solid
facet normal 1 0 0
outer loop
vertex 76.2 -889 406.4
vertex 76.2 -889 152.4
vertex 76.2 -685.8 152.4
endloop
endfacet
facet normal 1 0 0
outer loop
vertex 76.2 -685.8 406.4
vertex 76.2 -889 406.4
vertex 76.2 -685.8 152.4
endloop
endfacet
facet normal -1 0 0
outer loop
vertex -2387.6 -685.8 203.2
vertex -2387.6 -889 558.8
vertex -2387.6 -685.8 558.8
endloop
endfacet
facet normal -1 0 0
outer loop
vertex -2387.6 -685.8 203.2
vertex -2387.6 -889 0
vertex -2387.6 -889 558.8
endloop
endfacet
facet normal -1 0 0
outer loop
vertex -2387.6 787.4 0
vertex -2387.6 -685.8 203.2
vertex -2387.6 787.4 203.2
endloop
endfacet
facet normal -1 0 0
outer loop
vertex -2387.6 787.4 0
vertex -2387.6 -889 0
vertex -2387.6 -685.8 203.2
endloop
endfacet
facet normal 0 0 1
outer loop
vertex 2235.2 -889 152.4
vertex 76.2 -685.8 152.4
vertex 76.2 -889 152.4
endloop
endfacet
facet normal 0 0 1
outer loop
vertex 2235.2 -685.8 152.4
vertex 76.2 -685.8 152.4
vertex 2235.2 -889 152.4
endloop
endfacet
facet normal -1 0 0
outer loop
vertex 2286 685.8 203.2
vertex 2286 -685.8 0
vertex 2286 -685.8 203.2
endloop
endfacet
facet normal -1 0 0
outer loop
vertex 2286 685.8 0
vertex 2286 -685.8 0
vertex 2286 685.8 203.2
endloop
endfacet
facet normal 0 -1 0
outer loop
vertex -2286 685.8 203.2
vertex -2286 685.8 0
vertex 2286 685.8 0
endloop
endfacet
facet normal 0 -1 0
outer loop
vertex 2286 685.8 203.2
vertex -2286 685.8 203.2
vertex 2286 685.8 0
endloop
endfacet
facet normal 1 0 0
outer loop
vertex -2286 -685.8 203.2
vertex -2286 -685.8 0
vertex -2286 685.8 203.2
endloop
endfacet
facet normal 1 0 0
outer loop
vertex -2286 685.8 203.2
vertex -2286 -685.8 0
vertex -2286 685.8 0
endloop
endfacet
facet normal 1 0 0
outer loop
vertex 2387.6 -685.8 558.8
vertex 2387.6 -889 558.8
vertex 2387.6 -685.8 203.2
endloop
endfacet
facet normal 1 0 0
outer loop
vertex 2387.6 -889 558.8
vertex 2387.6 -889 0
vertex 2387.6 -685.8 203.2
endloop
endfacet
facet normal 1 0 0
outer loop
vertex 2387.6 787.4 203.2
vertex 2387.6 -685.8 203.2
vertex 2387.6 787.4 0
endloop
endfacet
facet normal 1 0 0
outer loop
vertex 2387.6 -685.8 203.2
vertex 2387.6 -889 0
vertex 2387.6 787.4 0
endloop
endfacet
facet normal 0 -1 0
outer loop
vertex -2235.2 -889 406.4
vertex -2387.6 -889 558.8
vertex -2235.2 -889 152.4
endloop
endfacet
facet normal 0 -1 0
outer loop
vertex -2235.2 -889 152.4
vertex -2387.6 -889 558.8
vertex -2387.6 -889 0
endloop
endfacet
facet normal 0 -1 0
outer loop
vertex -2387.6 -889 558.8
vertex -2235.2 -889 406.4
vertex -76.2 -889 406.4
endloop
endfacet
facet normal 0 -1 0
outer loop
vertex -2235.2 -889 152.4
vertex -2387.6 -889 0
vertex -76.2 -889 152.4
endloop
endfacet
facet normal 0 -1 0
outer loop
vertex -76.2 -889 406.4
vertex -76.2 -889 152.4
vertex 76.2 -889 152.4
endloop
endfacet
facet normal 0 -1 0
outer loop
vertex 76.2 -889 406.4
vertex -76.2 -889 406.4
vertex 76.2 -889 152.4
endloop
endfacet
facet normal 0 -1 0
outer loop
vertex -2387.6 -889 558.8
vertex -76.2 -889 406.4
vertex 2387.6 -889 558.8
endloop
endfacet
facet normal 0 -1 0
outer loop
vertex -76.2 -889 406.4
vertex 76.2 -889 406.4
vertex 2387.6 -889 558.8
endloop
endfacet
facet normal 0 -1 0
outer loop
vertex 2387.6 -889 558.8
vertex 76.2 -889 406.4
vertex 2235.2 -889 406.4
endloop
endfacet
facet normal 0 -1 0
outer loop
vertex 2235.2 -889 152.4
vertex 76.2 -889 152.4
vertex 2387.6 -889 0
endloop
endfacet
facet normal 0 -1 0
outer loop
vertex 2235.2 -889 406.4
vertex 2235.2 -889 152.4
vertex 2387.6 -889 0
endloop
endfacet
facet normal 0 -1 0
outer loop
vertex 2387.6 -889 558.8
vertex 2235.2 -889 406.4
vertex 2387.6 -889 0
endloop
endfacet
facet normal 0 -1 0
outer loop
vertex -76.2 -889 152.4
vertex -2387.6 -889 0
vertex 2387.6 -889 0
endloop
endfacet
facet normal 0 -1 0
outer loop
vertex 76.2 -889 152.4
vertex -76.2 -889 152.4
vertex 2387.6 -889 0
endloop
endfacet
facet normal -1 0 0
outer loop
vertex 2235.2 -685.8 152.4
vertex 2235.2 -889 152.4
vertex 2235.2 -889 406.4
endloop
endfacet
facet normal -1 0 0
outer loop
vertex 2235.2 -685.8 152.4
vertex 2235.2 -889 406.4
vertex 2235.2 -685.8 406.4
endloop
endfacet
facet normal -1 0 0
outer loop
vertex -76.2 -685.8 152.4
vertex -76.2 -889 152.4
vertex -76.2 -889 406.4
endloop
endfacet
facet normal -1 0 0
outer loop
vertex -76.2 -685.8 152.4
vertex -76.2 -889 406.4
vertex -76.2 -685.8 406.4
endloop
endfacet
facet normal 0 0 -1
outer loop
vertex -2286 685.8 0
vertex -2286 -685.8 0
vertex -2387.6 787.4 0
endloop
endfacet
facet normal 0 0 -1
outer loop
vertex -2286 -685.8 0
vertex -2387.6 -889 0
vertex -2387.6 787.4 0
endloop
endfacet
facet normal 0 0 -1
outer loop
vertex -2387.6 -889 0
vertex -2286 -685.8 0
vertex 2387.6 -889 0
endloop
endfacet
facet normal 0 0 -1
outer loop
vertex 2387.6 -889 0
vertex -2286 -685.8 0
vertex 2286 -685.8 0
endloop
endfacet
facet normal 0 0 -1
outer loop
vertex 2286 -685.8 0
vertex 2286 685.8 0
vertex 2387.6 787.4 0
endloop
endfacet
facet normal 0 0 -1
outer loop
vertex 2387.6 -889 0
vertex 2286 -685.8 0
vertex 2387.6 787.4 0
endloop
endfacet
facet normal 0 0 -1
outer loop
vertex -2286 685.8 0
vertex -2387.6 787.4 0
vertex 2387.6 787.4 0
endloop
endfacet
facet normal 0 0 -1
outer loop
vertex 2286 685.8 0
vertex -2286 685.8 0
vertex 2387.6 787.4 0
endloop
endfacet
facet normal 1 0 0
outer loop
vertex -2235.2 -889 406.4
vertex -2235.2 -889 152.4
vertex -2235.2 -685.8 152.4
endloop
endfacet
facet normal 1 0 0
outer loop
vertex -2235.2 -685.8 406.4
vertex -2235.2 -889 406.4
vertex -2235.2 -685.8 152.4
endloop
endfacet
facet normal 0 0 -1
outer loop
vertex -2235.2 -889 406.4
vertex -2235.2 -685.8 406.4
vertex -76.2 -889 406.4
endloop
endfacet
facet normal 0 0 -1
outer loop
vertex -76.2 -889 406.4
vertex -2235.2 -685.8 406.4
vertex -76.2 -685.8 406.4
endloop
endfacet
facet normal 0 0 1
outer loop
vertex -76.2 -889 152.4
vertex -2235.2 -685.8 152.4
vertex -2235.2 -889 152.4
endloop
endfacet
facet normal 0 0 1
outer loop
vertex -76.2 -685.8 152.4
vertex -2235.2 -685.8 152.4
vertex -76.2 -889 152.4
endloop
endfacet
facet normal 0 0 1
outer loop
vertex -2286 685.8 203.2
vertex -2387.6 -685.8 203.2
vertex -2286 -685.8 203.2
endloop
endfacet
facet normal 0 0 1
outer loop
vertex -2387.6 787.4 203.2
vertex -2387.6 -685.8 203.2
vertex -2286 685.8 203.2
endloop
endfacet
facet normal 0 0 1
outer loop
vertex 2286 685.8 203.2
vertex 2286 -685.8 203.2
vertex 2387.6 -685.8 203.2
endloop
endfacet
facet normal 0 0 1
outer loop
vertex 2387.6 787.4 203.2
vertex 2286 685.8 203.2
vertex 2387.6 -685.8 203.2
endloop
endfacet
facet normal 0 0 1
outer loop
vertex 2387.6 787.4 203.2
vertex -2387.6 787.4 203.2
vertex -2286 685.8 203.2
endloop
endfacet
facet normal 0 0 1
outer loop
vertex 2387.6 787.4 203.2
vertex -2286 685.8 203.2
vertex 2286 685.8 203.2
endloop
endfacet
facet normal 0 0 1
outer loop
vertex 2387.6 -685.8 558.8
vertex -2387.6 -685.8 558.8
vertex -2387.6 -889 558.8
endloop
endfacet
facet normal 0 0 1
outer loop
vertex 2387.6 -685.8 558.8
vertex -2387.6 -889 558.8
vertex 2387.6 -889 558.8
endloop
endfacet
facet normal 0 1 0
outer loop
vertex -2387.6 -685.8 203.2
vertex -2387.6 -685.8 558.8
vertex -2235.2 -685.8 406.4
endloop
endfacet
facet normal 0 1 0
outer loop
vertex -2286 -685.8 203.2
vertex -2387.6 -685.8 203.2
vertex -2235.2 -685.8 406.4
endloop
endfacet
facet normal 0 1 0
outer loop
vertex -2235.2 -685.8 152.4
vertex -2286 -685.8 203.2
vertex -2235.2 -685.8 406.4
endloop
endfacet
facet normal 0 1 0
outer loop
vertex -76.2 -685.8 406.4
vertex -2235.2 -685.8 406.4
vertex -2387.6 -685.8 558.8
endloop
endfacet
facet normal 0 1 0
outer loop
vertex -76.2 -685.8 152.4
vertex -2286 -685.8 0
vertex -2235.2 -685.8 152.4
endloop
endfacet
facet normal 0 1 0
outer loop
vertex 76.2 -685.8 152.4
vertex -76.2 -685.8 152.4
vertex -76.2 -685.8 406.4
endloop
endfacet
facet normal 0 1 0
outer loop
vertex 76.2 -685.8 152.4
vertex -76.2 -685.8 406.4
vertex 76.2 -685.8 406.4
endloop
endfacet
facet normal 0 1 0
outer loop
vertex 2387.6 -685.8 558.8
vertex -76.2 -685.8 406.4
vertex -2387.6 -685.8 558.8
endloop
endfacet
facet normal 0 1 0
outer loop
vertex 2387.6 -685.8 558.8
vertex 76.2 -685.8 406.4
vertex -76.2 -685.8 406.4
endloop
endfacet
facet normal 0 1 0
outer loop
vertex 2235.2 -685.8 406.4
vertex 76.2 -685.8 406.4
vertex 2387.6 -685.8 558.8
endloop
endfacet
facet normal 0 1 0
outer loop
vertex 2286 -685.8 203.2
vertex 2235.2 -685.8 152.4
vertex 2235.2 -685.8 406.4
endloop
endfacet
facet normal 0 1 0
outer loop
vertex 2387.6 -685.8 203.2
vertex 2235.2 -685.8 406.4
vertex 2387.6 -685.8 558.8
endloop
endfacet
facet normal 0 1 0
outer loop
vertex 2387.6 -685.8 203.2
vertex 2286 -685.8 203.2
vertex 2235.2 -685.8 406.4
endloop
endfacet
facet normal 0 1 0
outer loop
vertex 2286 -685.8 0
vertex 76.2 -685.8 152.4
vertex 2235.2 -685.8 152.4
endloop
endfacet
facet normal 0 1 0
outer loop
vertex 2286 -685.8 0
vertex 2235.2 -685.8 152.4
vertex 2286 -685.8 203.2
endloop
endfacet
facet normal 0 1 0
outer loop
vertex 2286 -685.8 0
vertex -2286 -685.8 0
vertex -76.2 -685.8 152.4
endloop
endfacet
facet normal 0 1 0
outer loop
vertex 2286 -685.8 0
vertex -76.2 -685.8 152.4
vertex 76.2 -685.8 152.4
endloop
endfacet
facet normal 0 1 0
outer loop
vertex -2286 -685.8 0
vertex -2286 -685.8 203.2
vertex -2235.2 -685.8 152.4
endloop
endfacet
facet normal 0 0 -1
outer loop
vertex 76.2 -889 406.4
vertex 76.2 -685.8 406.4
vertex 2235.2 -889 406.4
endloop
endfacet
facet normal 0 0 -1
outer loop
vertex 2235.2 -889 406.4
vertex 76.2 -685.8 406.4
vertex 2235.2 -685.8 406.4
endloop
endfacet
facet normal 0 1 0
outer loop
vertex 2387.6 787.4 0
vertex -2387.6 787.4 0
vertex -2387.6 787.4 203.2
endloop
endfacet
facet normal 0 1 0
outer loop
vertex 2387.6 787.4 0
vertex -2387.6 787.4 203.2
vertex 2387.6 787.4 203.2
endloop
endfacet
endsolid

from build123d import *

# Parameters (mm, degrees)
F0_W     = 4775.2
F0_H     = 1676.4
F0_W_2   = 4572
F0_H_2   = 1371.6
F1_DEPTH = 203.2
F2_W     = 4775.2
F2_H     = 203.2
F3_DEPTH = 50.8
F4_W     = 152.4
F4_H     = 203.2
F5_DEPTH = 254
F6_W     = 4775.2
F6_H     = 203.2
F7_DEPTH = 152.4


with BuildPart() as f1:
    # F0 (on Top) → F1 (new body)
    with BuildSketch(Plane.XY):
        with Locations((0, -50.8)):
            Rectangle(F0_W, F0_H)
        Rectangle(F0_W_2, F0_H_2, mode=Mode.SUBTRACT)
    extrude(amount=F1_DEPTH)

    # F2 (on face) → F3 (cut)
    with BuildSketch(Plane.XY.offset(203.2)):
        with Locations((0, -787.4)):
            Rectangle(F2_W, F2_H)
    extrude(amount=-F3_DEPTH, mode=Mode.SUBTRACT)

    # F4 (on face) → F5 (join)
    with BuildSketch(Plane.XY.offset(152.4)):
        with Locations((-2311.4, -787.4)):
            Rectangle(F4_W, F4_H)
        with Locations((2311.4, -787.4)):
            Rectangle(F4_W, F4_H)
        with Locations((0, -787.4)):
            Rectangle(F4_W, F4_H)
    extrude(amount=F5_DEPTH)

    # F6 (on face) → F7 (join)
    with BuildSketch(Plane.XY.offset(406.4)):
        with Locations((0, -787.4)):
            Rectangle(F6_W, F6_H)
    extrude(amount=F7_DEPTH)


solid = f1.part
